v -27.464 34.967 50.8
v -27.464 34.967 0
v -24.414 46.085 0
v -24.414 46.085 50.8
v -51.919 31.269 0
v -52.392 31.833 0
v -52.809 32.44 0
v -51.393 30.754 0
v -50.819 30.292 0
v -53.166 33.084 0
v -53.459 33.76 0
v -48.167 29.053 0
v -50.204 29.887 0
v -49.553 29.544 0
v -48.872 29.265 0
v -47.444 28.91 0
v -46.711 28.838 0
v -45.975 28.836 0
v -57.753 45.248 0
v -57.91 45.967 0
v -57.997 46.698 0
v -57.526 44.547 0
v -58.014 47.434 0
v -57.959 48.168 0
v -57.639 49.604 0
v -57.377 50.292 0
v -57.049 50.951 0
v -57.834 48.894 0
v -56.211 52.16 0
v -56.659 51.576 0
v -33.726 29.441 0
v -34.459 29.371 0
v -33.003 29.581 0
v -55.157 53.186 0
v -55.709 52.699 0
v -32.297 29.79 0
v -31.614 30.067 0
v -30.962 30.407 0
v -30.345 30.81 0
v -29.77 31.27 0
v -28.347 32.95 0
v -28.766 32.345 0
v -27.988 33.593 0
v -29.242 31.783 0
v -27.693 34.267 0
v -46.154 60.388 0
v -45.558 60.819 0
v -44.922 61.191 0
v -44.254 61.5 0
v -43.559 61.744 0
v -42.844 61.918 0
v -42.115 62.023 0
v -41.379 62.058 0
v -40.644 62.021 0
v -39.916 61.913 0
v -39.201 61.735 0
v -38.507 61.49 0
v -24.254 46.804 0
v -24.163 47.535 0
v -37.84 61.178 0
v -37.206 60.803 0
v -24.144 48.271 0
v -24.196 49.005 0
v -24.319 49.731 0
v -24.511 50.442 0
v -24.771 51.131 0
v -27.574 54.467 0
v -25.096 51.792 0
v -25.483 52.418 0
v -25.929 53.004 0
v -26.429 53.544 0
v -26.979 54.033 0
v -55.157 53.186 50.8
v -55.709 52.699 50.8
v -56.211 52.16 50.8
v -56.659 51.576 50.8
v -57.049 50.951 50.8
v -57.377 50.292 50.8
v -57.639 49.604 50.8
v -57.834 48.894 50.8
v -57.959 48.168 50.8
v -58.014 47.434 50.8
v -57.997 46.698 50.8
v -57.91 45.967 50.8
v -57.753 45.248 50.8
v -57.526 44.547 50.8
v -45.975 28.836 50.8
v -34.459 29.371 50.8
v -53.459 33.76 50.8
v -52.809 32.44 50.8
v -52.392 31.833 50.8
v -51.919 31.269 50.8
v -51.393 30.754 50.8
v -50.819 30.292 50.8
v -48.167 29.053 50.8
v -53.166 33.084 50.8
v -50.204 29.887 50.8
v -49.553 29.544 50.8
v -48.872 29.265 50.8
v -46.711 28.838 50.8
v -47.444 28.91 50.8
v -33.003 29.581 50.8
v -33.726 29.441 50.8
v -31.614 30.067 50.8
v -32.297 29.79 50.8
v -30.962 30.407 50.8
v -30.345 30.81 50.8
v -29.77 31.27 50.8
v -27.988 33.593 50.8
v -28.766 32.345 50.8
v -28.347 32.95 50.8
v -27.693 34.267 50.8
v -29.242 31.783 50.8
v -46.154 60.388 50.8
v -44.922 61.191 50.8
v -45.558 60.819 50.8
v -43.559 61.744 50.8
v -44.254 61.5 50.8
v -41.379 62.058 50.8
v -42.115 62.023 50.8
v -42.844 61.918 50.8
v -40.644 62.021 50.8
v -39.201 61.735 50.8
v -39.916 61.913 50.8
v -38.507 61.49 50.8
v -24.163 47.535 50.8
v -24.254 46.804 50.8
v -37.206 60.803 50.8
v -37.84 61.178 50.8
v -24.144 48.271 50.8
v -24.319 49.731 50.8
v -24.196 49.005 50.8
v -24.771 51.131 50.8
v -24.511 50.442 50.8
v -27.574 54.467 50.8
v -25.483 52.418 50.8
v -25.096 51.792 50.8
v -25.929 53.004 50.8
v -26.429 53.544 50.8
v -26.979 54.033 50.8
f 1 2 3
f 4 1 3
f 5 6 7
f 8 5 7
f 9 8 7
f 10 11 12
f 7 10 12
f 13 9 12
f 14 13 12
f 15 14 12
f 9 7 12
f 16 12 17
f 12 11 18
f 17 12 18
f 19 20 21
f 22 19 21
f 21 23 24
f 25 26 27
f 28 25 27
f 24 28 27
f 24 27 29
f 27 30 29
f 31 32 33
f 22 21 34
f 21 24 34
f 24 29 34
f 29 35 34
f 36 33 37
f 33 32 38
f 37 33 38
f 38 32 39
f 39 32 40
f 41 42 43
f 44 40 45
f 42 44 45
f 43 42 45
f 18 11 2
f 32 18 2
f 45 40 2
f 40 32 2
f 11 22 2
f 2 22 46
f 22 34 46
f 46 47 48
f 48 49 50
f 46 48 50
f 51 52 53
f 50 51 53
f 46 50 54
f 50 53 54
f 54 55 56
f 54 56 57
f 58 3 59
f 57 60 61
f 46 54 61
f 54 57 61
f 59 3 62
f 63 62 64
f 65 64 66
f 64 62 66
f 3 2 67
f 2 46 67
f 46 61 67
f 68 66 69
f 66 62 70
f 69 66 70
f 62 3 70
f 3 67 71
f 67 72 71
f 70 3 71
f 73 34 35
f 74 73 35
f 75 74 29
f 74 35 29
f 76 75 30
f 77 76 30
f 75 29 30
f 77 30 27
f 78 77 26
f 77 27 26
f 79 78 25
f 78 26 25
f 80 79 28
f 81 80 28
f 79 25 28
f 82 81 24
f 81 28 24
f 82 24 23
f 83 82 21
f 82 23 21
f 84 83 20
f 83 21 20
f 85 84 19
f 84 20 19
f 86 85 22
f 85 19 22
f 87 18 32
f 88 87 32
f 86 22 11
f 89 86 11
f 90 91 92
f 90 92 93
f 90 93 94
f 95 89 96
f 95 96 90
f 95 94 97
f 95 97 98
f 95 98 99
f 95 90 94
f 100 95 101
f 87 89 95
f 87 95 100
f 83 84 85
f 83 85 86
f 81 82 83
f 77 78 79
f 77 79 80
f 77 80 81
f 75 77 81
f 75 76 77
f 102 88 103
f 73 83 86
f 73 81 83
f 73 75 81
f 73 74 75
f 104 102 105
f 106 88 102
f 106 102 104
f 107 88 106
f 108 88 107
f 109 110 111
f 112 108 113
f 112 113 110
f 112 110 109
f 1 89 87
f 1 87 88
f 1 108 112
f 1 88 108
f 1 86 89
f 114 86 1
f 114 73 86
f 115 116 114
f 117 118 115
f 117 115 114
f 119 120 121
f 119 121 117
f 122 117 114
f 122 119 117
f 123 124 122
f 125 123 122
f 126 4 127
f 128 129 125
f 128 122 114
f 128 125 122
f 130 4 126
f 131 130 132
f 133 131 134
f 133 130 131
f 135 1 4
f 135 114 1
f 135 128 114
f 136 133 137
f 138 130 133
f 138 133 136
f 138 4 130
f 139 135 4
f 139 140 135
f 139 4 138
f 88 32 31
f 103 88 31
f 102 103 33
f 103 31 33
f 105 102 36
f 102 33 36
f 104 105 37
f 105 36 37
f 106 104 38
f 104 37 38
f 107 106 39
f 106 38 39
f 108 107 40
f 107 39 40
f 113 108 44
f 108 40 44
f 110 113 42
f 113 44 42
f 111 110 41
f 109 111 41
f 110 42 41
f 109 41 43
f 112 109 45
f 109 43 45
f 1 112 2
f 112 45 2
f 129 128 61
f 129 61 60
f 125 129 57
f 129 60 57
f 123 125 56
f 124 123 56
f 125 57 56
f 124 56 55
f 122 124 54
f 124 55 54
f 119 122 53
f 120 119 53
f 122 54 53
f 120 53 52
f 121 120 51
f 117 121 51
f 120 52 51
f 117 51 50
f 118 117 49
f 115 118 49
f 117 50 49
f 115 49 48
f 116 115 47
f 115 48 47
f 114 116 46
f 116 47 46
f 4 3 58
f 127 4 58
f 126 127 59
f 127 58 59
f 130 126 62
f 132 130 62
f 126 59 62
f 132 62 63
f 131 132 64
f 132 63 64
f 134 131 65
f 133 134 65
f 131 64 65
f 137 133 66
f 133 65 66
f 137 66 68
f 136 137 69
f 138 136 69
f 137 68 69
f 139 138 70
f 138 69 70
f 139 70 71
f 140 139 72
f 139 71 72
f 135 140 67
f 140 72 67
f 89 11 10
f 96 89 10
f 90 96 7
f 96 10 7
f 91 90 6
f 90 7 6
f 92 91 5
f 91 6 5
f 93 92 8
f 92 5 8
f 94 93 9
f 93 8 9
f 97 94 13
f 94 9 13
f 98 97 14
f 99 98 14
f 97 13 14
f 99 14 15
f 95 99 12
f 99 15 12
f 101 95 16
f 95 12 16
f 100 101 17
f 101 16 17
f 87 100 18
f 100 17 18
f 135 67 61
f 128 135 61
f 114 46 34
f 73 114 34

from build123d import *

# Parameters (mm, degrees)
F1_DEPTH = 50.8


with BuildPart() as f1:
    # F0 (on Top) → F1 (new body)
    with BuildSketch(Plane.XY):
        with BuildLine():
            Line((-45.975181, 28.836208), (-34.458694, 29.371214))
            ThreePointArc((-34.458694, 29.371214), (-30.05213, 31.032784), (-27.46379, 34.967137))
            Line((-27.46379, 34.967137), (-24.413821, 46.085292))
            ThreePointArc((-24.413821, 46.085292), (-24.632365, 50.789637), (-27.574315, 54.467076))
            Line((-27.574315, 54.467076), (-37.205817, 60.803468))
            ThreePointArc((-37.205817, 60.803468), (-41.747449, 62.049343), (-46.154014, 60.387773))
            Line((-46.154014, 60.387773), (-55.156579, 53.185723))
            ThreePointArc((-55.156579, 53.185723), (-57.744918, 49.251371), (-57.526374, 44.547026))
            Line((-57.526374, 44.547026), (-53.458763, 33.759522))
            ThreePointArc((-53.458763, 33.759522), (-50.516813, 30.082084), (-45.975181, 28.836208))
        make_face()
    extrude(amount=F1_DEPTH)


solid = f1.part
